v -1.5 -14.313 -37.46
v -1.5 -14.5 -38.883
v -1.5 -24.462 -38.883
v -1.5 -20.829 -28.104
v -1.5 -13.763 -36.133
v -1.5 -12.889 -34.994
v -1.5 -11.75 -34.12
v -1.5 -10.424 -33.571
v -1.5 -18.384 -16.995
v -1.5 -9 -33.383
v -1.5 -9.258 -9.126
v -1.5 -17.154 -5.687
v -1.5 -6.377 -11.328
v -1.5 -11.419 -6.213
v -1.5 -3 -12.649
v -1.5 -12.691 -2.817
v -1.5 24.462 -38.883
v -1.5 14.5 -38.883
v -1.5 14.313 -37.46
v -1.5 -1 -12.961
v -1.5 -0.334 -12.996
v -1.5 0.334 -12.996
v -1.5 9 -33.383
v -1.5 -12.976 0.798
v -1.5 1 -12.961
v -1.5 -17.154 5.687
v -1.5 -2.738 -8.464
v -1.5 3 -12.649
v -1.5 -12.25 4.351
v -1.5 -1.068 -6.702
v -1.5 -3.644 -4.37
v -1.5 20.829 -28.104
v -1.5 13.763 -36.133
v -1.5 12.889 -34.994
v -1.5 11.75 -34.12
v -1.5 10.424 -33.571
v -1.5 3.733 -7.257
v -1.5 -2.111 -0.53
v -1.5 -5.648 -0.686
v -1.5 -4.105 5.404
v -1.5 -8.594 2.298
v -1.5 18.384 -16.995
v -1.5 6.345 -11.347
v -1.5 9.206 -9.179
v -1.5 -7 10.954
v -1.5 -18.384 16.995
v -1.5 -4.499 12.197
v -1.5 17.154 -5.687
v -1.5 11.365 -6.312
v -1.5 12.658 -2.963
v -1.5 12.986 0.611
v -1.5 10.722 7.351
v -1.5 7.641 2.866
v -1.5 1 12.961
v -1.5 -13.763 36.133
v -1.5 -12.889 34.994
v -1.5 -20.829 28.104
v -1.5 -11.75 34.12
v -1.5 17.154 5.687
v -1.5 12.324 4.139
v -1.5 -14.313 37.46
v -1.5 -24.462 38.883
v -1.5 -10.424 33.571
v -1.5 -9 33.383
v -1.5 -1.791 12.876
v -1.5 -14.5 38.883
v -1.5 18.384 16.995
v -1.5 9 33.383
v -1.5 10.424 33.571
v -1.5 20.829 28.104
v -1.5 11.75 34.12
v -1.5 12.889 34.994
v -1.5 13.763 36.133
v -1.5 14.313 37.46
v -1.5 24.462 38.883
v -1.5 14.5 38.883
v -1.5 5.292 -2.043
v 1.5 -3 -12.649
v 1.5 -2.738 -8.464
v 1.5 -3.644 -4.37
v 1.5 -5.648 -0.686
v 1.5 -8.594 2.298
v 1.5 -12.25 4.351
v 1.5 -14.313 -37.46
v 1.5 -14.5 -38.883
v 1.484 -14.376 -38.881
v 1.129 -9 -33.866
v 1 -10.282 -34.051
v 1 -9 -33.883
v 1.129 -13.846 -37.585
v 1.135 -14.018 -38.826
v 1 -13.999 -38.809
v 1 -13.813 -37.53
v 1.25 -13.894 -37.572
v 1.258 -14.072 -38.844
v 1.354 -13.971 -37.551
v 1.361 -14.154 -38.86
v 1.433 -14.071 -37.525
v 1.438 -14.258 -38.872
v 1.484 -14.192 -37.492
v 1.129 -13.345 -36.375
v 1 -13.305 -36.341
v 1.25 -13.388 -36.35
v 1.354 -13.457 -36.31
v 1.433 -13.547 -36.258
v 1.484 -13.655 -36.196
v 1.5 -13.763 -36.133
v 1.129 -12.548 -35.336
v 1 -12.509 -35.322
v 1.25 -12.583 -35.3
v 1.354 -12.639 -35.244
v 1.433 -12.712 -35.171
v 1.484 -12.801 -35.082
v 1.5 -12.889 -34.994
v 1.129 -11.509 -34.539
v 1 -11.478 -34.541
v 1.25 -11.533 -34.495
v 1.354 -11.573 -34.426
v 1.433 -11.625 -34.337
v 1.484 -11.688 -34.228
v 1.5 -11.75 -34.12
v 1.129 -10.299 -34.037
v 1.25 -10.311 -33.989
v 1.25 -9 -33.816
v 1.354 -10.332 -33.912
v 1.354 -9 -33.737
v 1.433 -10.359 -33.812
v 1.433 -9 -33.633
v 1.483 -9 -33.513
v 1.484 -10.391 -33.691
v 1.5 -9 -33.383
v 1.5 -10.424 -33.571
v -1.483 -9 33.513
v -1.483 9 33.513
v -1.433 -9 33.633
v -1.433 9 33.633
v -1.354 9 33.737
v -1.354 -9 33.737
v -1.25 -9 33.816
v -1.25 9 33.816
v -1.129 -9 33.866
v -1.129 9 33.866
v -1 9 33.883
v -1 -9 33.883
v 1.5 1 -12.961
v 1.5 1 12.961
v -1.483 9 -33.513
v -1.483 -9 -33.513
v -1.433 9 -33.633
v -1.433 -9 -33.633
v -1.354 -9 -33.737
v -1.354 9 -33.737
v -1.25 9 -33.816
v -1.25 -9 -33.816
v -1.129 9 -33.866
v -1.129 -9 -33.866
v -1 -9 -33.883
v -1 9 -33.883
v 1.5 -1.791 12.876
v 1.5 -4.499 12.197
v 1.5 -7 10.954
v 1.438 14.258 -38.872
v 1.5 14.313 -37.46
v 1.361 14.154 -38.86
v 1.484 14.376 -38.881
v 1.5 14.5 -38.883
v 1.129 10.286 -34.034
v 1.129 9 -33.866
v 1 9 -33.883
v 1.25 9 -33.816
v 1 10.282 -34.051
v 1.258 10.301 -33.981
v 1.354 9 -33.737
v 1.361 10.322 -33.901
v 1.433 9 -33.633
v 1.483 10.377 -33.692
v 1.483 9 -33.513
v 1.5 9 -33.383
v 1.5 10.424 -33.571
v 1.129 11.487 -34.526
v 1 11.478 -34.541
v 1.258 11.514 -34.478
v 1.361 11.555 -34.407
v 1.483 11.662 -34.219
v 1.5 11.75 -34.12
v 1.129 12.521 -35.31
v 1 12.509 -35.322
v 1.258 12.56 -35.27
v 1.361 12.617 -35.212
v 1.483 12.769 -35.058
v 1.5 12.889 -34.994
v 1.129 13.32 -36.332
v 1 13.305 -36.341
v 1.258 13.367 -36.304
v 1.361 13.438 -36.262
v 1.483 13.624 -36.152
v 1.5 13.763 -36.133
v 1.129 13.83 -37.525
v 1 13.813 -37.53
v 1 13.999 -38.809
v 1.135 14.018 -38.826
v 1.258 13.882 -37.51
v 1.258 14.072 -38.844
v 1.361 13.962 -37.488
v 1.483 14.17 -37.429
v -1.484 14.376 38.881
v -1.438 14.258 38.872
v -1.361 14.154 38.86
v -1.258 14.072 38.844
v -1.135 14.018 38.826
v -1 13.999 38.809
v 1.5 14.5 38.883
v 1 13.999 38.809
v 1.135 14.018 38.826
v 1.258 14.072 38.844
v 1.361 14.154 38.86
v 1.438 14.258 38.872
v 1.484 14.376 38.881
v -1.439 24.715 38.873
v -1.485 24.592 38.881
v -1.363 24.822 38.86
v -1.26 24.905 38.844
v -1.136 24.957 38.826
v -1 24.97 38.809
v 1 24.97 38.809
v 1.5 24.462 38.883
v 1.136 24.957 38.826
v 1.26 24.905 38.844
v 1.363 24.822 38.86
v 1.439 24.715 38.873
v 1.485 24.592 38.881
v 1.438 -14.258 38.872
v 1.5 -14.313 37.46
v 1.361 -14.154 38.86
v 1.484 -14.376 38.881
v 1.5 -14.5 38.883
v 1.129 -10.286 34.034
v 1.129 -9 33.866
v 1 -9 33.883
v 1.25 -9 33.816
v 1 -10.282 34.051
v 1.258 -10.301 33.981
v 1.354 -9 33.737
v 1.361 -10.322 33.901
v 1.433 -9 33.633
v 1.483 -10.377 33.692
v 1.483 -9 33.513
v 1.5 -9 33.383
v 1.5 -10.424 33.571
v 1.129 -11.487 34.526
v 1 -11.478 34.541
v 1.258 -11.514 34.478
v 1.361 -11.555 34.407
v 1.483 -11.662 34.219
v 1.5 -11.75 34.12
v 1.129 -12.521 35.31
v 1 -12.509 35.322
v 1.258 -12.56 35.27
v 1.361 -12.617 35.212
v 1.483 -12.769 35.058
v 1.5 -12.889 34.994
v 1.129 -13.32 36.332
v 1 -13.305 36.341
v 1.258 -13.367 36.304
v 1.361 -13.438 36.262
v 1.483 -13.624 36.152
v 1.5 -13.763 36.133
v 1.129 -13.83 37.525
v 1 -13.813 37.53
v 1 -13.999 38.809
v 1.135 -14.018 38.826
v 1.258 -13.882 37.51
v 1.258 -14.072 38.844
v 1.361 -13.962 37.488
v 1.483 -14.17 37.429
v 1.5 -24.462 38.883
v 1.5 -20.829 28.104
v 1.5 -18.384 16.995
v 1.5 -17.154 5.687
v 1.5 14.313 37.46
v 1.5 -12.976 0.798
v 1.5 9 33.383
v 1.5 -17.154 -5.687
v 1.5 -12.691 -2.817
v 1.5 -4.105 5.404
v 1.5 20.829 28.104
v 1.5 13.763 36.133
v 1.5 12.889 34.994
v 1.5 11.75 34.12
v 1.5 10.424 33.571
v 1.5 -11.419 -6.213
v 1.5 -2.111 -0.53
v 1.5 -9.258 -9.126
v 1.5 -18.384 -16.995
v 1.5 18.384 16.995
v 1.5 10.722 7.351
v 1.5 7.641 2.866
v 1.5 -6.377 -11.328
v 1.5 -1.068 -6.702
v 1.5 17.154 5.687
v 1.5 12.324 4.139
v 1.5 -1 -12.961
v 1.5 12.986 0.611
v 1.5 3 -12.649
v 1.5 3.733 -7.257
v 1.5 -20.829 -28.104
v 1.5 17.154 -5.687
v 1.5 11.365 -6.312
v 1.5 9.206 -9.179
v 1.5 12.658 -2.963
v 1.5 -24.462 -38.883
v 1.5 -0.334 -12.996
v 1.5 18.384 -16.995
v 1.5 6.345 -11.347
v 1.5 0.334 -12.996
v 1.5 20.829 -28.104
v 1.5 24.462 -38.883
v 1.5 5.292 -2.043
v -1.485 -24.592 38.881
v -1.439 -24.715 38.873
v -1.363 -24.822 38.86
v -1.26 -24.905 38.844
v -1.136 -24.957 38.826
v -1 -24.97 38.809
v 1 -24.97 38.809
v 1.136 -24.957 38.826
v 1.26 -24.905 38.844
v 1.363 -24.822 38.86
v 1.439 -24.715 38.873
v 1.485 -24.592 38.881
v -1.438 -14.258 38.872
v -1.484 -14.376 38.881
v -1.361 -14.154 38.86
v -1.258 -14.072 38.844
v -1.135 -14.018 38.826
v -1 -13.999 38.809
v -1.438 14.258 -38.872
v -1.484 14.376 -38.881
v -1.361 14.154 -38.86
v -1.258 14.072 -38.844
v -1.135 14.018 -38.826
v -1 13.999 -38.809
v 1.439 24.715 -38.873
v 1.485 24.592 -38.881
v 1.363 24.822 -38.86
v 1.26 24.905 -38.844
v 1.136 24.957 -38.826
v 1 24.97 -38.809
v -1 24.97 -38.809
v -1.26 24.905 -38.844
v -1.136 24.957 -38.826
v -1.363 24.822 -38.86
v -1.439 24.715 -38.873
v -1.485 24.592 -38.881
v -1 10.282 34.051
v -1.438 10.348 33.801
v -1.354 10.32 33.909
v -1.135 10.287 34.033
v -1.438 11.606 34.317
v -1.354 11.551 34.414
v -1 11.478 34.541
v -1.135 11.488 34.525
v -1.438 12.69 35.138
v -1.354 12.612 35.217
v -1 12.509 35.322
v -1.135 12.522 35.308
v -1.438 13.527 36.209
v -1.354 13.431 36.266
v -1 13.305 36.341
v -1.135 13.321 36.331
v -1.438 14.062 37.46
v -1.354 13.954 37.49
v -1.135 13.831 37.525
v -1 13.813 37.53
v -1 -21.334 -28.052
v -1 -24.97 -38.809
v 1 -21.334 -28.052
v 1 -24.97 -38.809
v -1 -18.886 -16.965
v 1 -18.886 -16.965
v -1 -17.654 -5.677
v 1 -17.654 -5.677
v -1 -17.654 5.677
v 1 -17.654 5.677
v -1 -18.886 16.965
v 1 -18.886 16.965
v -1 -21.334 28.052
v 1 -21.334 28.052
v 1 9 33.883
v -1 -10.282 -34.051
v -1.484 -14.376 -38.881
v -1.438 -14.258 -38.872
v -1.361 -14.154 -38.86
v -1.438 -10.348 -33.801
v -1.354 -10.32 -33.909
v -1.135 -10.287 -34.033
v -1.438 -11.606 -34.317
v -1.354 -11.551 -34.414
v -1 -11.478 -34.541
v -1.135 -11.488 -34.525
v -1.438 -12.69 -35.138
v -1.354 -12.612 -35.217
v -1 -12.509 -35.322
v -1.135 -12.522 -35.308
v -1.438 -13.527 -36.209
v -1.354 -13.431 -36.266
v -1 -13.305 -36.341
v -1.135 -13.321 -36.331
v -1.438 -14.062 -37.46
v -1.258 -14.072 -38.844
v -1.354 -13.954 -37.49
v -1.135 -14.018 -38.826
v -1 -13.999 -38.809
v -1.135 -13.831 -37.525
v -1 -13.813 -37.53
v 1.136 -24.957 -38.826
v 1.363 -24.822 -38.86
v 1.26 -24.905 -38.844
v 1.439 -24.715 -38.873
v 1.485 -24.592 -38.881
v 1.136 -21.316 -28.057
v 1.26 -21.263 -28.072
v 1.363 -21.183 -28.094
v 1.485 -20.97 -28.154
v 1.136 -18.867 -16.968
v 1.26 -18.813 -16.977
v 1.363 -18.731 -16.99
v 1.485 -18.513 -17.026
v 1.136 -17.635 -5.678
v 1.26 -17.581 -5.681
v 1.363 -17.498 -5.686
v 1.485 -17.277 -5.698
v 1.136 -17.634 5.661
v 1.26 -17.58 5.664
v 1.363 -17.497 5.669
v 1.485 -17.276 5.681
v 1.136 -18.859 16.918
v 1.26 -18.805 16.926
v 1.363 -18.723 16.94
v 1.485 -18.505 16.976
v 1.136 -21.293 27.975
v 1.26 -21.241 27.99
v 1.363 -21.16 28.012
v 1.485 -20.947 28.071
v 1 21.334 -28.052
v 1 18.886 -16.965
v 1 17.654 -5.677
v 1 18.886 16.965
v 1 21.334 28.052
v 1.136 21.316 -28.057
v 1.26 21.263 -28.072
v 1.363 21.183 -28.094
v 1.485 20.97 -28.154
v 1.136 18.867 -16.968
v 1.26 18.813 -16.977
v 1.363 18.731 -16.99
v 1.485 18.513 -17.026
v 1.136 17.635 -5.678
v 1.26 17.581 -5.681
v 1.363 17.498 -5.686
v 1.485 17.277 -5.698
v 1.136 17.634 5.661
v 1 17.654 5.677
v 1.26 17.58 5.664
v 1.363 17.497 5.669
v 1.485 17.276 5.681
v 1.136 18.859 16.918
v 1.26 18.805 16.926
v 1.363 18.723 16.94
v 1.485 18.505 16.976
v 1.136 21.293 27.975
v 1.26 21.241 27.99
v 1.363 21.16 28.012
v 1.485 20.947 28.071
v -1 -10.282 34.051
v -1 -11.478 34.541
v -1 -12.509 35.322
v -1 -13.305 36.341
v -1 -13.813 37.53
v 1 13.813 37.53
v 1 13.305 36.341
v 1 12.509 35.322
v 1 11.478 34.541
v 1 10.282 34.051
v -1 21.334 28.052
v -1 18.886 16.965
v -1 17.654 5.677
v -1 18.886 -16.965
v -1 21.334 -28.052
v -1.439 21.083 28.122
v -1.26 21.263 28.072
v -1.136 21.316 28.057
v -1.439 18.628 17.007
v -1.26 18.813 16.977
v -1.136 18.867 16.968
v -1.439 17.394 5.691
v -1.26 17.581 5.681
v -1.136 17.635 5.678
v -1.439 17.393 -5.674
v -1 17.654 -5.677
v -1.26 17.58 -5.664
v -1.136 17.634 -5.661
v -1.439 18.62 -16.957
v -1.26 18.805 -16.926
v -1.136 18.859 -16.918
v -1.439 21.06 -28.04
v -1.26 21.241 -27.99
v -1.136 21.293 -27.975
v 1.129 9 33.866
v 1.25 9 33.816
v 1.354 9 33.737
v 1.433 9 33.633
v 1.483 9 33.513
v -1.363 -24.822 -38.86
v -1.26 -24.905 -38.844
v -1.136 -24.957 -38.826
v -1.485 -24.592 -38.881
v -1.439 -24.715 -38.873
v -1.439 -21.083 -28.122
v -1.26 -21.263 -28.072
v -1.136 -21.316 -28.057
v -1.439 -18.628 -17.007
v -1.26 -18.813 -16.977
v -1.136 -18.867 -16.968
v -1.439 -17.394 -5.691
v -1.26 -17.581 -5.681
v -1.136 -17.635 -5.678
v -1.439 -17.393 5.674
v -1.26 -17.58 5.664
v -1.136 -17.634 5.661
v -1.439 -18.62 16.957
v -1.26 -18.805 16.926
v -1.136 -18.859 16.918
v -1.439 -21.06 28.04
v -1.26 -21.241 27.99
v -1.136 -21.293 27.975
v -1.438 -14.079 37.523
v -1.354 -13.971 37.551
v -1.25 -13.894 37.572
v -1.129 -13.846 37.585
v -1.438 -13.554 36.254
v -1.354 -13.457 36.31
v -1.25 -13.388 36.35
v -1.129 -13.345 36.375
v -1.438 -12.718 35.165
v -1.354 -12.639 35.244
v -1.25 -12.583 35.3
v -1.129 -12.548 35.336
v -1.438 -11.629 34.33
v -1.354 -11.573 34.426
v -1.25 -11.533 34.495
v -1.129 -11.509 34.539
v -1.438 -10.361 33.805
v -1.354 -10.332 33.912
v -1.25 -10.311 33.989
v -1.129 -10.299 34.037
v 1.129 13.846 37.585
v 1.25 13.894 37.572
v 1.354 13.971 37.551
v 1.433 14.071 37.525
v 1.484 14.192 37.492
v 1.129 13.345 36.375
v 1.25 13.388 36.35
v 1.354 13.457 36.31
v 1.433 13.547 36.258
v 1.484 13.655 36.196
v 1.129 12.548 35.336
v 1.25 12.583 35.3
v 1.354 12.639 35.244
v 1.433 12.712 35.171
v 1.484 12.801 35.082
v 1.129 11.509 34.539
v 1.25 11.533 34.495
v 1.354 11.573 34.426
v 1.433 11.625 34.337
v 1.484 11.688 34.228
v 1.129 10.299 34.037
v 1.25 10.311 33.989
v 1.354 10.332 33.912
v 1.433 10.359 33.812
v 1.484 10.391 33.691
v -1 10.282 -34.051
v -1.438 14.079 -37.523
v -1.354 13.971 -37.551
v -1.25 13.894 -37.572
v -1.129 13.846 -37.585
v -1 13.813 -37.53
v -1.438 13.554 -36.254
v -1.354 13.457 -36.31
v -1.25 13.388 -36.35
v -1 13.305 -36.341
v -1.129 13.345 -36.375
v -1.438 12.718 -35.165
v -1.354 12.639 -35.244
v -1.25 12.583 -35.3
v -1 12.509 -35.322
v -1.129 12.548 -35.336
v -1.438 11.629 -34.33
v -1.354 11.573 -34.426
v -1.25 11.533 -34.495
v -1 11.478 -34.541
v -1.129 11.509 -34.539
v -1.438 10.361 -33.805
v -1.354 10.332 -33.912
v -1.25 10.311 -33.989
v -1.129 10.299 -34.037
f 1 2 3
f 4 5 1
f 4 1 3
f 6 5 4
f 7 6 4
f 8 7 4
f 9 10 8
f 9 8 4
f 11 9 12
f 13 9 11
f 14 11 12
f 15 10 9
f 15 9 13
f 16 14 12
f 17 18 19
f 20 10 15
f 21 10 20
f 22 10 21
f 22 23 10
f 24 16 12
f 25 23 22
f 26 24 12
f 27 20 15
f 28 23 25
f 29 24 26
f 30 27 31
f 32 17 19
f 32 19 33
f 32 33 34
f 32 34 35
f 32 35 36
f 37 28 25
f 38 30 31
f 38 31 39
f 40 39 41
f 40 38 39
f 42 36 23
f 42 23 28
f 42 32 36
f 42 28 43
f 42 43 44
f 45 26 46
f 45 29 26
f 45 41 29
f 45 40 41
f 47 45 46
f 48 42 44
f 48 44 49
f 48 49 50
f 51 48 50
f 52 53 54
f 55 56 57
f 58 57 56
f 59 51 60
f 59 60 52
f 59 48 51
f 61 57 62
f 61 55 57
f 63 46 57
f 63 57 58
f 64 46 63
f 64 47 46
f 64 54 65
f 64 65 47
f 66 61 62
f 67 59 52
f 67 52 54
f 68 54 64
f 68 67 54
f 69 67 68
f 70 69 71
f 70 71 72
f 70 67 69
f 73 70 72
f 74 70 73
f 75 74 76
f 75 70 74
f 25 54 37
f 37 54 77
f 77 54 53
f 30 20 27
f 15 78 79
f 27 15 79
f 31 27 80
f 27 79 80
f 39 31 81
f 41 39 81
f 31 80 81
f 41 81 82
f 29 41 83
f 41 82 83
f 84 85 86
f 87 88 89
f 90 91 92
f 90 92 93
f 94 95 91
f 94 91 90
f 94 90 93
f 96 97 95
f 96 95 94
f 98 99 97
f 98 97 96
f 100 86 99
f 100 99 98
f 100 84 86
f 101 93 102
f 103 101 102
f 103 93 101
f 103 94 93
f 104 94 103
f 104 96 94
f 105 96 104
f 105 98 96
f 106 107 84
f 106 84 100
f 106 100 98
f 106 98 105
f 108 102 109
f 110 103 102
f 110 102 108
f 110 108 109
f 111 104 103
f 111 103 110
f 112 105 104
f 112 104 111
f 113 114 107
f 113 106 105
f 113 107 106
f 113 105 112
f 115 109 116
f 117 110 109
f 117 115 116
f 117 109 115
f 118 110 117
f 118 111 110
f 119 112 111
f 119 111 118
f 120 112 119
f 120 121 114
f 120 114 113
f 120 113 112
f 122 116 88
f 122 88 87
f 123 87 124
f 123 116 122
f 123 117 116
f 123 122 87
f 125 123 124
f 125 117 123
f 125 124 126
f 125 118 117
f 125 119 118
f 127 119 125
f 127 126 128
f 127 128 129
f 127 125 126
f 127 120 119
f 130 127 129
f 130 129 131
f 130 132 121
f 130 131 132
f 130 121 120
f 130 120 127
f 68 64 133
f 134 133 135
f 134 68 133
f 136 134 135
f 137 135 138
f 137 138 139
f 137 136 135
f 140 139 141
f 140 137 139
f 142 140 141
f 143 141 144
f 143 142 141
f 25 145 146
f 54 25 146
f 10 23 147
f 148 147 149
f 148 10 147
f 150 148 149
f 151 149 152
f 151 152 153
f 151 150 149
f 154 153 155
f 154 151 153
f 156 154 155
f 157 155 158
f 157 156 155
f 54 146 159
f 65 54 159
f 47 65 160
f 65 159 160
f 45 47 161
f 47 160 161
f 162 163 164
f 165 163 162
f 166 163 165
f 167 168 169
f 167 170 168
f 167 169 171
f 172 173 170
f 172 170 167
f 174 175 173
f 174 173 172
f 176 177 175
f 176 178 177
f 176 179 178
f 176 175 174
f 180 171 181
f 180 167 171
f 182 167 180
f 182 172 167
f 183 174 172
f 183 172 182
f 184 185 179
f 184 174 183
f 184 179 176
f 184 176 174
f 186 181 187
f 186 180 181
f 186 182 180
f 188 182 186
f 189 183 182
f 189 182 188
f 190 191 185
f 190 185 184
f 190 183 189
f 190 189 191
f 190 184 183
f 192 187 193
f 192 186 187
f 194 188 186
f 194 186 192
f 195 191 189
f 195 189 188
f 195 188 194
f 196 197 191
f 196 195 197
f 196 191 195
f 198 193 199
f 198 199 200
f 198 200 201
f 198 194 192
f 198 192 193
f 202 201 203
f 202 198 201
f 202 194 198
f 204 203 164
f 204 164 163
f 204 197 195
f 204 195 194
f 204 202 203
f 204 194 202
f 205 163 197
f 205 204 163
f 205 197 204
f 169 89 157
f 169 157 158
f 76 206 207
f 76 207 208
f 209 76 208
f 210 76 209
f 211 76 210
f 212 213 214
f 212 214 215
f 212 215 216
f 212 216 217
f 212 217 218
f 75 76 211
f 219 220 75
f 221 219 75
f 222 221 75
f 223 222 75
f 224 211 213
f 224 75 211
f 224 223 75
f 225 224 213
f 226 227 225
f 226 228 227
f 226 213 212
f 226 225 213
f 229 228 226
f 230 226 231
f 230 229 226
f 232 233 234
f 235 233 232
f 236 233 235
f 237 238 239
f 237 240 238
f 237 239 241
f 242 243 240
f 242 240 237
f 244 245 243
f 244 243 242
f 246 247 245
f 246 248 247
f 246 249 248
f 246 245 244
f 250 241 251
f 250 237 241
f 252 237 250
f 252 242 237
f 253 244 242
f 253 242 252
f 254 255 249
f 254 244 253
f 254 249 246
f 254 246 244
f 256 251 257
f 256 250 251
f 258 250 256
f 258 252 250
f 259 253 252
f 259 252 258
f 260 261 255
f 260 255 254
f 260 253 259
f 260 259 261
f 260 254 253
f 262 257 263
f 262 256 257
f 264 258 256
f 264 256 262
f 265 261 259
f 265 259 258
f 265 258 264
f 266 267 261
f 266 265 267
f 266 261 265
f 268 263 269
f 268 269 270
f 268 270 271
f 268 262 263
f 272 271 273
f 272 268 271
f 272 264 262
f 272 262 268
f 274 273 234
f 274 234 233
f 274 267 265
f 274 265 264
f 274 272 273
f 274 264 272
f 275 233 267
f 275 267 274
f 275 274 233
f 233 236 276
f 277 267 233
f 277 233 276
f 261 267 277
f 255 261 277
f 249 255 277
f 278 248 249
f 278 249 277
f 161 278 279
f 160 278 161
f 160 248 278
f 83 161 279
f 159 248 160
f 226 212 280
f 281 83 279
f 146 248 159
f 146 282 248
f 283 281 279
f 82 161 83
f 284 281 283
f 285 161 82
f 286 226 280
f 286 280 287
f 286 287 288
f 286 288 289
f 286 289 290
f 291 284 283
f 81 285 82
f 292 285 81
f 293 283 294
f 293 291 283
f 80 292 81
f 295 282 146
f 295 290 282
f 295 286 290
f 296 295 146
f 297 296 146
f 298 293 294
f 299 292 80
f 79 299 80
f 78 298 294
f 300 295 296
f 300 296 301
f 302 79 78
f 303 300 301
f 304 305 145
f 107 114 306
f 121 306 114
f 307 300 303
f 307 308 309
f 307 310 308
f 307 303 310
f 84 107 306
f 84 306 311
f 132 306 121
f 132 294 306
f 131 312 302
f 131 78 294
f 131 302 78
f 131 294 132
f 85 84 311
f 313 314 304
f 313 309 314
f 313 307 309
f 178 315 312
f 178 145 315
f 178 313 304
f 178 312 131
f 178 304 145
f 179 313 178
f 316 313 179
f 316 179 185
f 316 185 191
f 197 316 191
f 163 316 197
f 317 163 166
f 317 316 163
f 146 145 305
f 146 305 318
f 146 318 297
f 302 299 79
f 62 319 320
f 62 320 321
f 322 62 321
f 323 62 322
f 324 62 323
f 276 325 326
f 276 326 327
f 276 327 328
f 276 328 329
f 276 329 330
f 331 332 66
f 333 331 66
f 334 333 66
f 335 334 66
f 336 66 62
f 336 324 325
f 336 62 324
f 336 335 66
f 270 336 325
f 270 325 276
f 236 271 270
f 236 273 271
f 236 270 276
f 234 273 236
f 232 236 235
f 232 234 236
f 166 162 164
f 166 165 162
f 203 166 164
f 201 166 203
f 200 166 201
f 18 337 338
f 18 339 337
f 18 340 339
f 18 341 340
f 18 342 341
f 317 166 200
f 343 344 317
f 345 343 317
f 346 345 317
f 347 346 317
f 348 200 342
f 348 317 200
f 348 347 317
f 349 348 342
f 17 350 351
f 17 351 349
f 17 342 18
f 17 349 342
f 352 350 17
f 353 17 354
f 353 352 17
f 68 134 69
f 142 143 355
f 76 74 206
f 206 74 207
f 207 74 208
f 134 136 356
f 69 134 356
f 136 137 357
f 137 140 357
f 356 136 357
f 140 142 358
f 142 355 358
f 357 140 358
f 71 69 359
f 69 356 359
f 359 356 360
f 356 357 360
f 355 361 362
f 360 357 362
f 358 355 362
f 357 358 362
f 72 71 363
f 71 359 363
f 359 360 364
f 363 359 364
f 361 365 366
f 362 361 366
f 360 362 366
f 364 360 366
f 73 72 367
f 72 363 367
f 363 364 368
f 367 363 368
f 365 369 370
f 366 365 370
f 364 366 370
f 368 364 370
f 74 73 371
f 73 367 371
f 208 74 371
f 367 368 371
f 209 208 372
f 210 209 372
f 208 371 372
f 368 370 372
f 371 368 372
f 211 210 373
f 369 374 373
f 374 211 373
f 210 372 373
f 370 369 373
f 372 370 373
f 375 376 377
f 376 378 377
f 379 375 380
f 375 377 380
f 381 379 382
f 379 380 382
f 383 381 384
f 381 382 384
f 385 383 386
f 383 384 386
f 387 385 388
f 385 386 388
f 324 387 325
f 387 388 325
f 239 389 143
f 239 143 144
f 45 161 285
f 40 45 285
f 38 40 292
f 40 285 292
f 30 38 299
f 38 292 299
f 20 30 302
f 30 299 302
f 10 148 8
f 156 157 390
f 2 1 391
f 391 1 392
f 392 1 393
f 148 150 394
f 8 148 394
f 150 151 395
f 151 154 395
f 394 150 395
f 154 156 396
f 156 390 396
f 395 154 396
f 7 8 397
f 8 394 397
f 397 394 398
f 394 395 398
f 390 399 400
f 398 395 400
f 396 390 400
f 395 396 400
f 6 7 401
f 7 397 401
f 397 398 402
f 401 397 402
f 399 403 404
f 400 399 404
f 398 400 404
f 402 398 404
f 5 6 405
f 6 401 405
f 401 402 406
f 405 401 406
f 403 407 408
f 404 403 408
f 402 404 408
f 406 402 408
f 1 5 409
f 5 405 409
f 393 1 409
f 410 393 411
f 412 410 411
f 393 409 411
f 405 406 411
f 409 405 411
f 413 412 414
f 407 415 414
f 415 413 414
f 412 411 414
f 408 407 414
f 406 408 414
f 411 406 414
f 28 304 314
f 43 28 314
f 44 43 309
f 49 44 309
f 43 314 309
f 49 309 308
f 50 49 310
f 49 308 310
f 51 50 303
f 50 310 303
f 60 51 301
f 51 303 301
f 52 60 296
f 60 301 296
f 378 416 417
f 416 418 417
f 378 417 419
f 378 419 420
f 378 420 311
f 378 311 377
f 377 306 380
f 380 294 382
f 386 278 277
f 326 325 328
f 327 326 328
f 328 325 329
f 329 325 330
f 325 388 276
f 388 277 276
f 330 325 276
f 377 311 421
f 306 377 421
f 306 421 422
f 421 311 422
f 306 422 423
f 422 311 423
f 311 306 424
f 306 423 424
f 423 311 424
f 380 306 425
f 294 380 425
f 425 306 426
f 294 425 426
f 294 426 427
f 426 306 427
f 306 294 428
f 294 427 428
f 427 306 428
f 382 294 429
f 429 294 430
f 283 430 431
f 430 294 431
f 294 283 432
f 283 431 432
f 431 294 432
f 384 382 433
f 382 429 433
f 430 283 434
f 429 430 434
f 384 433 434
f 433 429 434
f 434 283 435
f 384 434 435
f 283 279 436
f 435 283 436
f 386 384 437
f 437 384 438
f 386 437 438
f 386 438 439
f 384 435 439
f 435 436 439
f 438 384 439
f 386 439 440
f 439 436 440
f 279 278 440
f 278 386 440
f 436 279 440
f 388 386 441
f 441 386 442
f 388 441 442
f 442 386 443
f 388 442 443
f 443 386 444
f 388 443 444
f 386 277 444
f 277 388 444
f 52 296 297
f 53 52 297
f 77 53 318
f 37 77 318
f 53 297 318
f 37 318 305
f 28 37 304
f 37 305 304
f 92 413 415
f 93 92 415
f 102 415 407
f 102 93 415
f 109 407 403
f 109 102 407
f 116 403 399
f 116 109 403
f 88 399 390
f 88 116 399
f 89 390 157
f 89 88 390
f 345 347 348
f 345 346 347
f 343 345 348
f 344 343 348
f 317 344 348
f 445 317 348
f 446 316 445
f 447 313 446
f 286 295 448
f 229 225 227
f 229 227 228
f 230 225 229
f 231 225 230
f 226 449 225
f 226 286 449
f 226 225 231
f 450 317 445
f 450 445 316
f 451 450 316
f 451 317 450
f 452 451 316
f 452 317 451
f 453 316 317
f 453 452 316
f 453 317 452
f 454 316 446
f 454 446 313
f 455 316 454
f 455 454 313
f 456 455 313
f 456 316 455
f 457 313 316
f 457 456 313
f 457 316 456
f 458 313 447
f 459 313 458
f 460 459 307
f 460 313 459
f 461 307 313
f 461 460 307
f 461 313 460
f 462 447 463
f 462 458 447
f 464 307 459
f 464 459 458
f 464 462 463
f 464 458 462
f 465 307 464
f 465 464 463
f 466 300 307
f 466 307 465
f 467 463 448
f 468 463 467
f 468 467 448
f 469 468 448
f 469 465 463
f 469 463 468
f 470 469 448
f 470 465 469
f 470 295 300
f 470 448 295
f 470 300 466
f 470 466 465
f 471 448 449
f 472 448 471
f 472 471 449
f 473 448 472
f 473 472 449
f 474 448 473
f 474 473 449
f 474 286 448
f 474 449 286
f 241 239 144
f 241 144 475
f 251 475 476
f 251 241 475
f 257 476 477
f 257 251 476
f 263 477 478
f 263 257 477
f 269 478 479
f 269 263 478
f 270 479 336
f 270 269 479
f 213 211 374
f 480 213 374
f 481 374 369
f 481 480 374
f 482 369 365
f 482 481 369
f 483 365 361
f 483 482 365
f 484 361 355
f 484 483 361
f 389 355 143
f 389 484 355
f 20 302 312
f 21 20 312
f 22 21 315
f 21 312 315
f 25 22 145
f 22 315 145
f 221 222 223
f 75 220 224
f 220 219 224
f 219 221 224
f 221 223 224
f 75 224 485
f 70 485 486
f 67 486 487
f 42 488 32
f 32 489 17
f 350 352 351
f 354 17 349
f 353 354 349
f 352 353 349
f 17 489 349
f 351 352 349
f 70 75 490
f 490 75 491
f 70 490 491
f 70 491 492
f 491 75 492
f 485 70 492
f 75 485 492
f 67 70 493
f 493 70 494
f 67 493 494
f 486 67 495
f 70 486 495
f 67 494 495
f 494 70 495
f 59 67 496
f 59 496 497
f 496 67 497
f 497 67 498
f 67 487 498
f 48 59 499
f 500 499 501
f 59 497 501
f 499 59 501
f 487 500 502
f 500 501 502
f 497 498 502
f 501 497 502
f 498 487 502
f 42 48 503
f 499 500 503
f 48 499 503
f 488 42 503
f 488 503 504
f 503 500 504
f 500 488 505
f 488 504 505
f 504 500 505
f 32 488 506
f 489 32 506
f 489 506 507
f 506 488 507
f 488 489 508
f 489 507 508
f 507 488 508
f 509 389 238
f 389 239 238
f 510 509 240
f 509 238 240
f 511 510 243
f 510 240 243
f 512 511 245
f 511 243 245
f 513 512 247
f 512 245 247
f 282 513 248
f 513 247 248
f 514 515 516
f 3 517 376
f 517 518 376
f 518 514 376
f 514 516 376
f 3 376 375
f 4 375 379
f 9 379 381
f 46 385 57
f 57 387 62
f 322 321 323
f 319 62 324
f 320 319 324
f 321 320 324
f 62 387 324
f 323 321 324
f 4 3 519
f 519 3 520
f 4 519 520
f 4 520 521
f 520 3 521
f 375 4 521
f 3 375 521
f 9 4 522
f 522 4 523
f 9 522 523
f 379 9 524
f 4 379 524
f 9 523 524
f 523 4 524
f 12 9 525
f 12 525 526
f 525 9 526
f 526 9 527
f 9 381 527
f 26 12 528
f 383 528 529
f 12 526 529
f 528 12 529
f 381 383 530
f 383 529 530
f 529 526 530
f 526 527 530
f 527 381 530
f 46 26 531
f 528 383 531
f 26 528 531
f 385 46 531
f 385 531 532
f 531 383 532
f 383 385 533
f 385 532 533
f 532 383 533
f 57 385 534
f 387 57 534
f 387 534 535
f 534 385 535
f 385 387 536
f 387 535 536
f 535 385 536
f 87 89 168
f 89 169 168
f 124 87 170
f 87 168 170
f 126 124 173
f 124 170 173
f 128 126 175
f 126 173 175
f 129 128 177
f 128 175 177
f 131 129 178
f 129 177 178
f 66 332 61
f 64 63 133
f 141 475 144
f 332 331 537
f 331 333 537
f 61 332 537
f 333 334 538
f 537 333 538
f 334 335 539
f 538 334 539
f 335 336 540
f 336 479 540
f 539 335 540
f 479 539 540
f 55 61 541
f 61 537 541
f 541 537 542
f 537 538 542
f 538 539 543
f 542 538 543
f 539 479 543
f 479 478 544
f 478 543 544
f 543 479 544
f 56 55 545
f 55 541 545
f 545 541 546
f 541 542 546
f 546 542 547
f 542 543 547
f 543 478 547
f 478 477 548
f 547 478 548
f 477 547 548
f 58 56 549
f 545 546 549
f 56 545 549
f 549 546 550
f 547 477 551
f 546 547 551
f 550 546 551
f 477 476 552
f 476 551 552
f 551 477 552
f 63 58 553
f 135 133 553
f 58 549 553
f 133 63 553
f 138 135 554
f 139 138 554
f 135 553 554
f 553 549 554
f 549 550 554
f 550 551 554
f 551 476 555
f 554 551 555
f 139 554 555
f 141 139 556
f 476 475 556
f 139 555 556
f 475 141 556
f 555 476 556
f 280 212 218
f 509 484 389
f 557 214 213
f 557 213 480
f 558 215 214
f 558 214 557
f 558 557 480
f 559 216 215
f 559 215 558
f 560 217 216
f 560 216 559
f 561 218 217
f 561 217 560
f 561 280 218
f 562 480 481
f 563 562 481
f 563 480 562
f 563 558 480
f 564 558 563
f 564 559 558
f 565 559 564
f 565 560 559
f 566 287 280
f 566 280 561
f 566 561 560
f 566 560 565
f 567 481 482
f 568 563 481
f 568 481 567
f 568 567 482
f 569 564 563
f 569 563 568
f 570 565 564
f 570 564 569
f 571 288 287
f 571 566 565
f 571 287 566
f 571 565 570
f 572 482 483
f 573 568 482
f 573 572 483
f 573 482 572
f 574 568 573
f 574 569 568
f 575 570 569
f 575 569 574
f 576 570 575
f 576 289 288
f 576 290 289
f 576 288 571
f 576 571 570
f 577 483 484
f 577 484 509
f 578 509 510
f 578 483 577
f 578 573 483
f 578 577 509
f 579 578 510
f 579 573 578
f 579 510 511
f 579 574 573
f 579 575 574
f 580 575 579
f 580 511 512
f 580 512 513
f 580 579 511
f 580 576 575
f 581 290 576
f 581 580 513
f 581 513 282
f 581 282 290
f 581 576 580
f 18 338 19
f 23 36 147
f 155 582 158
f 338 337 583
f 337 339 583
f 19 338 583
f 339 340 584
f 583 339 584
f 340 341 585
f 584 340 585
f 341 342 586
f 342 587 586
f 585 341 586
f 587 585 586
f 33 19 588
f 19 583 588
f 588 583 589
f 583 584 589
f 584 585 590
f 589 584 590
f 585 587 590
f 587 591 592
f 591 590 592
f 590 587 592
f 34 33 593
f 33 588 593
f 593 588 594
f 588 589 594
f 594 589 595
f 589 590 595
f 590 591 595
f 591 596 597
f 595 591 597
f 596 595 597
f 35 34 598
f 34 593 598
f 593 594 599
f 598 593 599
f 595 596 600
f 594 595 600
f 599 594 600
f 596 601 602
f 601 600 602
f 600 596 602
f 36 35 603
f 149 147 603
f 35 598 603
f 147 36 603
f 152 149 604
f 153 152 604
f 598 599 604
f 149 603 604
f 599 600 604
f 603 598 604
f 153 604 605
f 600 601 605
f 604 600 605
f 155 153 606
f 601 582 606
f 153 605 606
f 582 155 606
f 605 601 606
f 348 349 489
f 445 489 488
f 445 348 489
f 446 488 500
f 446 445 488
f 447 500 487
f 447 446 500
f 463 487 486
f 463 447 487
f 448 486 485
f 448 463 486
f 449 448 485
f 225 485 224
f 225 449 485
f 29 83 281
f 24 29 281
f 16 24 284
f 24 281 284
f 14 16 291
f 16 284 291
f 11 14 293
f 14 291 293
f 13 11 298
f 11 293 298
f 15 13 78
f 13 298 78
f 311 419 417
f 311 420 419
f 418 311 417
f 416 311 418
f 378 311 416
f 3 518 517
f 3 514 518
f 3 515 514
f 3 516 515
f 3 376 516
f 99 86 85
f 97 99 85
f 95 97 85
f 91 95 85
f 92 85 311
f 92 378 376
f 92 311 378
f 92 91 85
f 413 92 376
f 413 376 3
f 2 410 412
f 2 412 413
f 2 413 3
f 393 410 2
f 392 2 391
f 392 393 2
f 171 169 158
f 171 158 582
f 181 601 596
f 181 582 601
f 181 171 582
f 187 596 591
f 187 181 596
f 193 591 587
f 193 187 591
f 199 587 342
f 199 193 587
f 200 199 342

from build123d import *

# Parameters (mm, degrees)
EXTRUSION1_DEPTH        = 25
ENL_V_MAT_EXTRU_1_DEPTH = 4
ENL_V_MAT_EXTRU_2_DEPTH = 4.0000001
CONG_1_R                = 0.5


with BuildPart() as part:
    # Esquisse1 → Extrusion1 (new body, symmetric)
    with BuildSketch(Plane(origin=(0, 0, 0), x_dir=(1, 0, 0), z_dir=(0, 1, 0))):
        with BuildLine():
            Line((-1.5, 38.883399735), (-1.5, -38.883399735))
            ThreePointArc((-1.5, -38.883399735), (0, -38.75), (1.5, -38.883399735))
            Line((1.5, -38.883399735), (1.5, 38.883399735))
            ThreePointArc((1.5, 38.883399735), (0, 38.75), (-1.5, 38.883399735))
        make_face()
    extrude(amount=EXTRUSION1_DEPTH, both=True)

    # Esquisse2 → Enlèv. mat.-Extru.1 (cut, through all)
    with BuildSketch(Plane(origin=(1.5, 0, 0), x_dir=(0, 0, -1), z_dir=(1, 0, 0))):
        with BuildLine():
            Line((-33.883399735, 9), (-33.883399735, -9))
            ThreePointArc((-33.883399735, -9), (-35.347865829, -12.535533906), (-38.883399735, -14))
            Line((-38.883399735, -14), (-38.883399735, 14))
            ThreePointArc((-38.883399735, 14), (-35.347865829, 12.535533906), (-33.883399735, 9))
        make_face()
        with BuildLine():
            Line((38.883399735, 14), (38.883399735, -14))
            ThreePointArc((38.883399735, -14), (35.347865829, -12.535533906), (33.883399735, -9))
            Line((33.883399735, -9), (33.883399735, 9))
            ThreePointArc((33.883399735, 9), (35.347865829, 12.535533906), (38.883399735, 14))
        make_face()
        with BuildLine():
            Line((-38.883399735, 25), (38.883399735, 25))
            ThreePointArc((38.883399735, 25), (0, 17.5), (-38.883399735, 25))
        make_face()
        with BuildLine():
            Line((-38.883399735, -25), (38.883399735, -25))
            ThreePointArc((38.883399735, -25), (0, -17.5), (-38.883399735, -25))
        make_face()
    extrude(amount=-ENL_V_MAT_EXTRU_1_DEPTH, mode=Mode.SUBTRACT)

    # Esquisse3 → Enlèv. mat.-Extru.2 (cut, through all)
    with BuildSketch(Plane(origin=(1.5, 0, 0), x_dir=(0, 0, -1), z_dir=(1, 0, 0))):
        with BuildLine():
            Line((12.961481397, 1), (-12.961481397, 1))
            ThreePointArc((-12.961481397, 1), (-12.609240952, -3.163390997), (-10.95445115, -7))
            ThreePointArc((-10.95445115, -7), (0.529660497, -2.111220787), (12.961481397, -1))
            ThreePointArc((12.961481397, -1), (13, 0), (12.961481397, 1))
        make_face()
        with BuildLine():
            ThreePointArc((-7.350889359, 10.722146503), (2.043285167, 5.292013474), (12.649110641, 3))
            ThreePointArc((12.649110641, 3), (4.682485861, 12.127420425), (-7.350889359, 10.722146503))
        make_face()
        with BuildLine():
            ThreePointArc((12.649110641, -3), (2.457687621, -4.516686577), (-4.350889359, -12.250296396))
            ThreePointArc((-4.350889359, -12.250296396), (6.213462397, -11.418970402), (12.649110641, -3))
        make_face()
    extrude(amount=-ENL_V_MAT_EXTRU_2_DEPTH, mode=Mode.SUBTRACT)

    # Congé1
    cong_1_edges = [part.edges().sort_by_distance(p)[0] for p in [
        (-1.5, 17.5, 0),
        (1.5, 17.5, 0),
        (-1.5, -17.5, 0),
        (1.5, -17.5, 0),
        (-1.5, 12.535533906, 35.347865829),
        (-1.5, -12.535533906, 35.347865829),
        (-1.5, 0, 33.883399735),
        (1.5, 12.535533906, 35.347865829),
        (1.5, -12.535533906, 35.347865829),
        (1.5, 0, 33.883399735),
        (-1.5, -12.535533906, -35.347865829),
        (-1.5, 12.535533906, -35.347865829),
        (-1.5, 0, -33.883399735),
        (1.5, -12.535533906, -35.347865829),
        (1.5, 12.535533906, -35.347865829),
        (1.5, 0, -33.883399735),
    ]]
    fillet(cong_1_edges, radius=CONG_1_R)


solid = part.part
